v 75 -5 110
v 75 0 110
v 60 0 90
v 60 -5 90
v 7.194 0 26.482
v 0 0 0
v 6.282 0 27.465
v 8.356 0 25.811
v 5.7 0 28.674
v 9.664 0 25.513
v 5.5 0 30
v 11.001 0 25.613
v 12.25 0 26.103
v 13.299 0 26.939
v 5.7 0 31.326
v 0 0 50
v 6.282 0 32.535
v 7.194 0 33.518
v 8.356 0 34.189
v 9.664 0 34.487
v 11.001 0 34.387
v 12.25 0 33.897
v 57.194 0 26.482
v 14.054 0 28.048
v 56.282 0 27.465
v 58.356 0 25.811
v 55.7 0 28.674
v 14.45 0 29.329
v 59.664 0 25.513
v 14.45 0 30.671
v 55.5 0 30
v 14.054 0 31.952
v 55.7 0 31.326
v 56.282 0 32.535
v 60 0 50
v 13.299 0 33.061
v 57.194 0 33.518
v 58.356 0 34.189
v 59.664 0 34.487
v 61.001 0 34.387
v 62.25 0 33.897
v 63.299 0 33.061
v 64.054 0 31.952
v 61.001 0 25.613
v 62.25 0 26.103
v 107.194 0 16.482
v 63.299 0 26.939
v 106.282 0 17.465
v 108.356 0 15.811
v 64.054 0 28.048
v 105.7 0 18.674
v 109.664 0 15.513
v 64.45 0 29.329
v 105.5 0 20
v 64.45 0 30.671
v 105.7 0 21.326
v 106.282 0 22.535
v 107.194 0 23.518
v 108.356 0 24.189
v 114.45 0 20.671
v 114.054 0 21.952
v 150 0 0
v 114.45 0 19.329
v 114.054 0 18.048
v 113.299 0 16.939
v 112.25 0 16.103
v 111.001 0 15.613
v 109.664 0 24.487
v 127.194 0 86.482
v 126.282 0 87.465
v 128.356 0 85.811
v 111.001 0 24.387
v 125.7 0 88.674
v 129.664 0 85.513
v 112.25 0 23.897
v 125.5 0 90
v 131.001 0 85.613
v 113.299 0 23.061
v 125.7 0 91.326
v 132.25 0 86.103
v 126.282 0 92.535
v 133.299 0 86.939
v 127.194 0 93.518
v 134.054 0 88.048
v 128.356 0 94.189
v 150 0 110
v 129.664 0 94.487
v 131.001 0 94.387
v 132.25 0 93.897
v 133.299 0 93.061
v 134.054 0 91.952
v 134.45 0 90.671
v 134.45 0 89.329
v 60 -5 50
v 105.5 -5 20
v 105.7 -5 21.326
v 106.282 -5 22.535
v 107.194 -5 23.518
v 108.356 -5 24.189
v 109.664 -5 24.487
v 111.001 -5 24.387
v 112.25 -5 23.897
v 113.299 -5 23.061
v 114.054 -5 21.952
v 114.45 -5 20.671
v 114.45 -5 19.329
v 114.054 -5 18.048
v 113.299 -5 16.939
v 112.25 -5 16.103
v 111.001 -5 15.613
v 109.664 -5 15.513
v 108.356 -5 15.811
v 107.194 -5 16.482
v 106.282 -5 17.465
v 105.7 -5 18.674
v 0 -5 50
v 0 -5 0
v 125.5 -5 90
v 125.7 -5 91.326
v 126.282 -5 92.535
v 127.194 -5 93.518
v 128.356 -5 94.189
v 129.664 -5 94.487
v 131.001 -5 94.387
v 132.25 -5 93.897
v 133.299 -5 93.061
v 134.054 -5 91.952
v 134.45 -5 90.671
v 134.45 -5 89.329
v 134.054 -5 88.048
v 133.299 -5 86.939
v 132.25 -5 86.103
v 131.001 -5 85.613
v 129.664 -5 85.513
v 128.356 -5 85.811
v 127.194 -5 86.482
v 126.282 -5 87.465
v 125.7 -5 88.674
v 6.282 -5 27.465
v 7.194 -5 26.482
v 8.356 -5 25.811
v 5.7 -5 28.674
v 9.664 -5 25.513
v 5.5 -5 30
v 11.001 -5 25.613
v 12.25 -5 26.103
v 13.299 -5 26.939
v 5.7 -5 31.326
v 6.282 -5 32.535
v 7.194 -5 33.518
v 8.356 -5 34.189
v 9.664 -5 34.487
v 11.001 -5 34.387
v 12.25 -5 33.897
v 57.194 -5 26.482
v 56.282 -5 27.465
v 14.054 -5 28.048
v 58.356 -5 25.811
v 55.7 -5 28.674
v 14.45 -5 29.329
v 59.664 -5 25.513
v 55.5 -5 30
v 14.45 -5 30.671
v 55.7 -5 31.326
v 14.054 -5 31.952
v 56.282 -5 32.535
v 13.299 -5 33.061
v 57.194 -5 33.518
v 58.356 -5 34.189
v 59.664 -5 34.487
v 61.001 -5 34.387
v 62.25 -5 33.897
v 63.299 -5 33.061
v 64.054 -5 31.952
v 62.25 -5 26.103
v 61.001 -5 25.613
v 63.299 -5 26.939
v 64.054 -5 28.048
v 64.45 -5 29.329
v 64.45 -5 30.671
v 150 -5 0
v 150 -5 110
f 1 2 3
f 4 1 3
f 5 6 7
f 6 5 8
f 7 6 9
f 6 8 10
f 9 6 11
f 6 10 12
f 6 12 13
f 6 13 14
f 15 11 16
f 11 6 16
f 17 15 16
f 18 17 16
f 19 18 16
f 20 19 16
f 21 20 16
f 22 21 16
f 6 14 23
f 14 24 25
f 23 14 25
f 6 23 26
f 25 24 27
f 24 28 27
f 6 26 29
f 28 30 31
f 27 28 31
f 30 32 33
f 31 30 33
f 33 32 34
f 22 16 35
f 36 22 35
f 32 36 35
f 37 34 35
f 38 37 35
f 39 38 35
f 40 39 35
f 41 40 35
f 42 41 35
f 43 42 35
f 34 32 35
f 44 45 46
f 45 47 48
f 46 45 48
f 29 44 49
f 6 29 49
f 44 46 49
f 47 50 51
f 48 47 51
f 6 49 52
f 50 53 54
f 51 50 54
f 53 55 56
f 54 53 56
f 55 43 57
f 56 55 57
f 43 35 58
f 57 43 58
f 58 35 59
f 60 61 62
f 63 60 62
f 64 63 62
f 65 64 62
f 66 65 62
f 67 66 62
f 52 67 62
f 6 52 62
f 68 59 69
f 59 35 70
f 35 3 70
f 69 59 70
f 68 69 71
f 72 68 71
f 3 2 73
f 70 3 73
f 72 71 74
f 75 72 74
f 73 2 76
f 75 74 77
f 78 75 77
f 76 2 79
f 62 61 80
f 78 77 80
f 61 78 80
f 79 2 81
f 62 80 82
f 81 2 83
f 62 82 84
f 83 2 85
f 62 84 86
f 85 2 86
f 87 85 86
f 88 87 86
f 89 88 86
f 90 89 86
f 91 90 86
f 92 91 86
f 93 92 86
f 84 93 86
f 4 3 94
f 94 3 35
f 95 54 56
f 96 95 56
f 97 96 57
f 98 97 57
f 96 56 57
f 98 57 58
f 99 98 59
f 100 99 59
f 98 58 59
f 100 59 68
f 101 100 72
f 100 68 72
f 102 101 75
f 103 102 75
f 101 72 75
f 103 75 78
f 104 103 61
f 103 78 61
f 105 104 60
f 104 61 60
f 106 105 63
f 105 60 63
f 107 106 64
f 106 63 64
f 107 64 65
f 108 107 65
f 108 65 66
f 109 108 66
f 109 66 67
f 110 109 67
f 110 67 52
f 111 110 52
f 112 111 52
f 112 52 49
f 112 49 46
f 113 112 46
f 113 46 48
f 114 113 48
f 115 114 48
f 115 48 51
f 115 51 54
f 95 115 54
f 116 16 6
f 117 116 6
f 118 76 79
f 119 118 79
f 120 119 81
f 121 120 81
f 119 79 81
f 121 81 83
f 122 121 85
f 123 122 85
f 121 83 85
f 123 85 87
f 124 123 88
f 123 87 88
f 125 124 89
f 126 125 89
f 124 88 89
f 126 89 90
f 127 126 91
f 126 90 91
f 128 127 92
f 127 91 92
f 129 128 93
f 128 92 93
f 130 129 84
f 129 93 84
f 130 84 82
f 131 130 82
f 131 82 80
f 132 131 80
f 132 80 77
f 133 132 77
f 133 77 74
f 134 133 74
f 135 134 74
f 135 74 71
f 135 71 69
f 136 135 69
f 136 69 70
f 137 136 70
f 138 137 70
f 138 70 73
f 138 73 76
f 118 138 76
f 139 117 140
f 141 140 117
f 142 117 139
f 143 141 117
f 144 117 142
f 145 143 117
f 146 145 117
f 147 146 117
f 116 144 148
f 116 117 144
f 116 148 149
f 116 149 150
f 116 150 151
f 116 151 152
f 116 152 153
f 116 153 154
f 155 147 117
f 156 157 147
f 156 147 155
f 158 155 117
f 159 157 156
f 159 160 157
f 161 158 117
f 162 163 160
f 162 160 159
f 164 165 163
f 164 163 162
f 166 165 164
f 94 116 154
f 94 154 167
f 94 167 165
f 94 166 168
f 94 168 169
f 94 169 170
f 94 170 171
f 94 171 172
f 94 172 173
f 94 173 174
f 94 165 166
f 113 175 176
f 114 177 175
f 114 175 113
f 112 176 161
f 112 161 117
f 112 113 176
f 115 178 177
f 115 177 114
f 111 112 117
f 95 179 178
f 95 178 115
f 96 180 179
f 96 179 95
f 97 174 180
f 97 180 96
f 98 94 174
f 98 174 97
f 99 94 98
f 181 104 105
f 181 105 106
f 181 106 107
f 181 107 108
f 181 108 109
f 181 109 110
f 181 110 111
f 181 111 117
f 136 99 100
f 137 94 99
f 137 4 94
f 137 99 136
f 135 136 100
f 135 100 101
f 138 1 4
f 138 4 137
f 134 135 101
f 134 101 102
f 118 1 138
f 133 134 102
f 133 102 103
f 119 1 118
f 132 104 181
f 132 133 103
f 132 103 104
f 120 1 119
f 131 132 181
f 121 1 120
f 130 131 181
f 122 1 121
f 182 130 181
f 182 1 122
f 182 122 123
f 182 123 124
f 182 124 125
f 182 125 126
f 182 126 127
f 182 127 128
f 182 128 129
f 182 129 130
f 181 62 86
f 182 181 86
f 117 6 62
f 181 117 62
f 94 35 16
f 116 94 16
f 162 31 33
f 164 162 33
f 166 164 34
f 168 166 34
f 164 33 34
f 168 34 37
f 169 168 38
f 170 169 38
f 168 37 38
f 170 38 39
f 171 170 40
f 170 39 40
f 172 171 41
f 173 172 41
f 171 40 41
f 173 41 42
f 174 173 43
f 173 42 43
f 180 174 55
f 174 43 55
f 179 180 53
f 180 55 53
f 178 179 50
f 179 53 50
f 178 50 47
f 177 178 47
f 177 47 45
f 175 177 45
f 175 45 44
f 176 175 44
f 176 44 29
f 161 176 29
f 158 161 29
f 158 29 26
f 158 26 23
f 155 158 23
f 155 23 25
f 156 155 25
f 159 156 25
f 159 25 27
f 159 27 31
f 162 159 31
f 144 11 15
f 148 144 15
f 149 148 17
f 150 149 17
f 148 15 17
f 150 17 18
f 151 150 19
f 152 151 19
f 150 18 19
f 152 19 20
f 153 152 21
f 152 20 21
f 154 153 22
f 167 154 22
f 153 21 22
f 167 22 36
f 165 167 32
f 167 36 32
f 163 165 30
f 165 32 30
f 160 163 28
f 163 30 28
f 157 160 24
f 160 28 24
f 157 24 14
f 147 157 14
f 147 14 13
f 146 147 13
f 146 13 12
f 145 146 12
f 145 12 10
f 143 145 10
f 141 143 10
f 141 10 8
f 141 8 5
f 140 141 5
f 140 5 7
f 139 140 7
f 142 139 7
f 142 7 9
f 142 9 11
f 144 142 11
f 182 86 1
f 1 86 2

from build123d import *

# Parameters (mm, degrees)
F1_DEPTH = 5
F3_D     = 9
F5_D     = 9


with BuildPart() as f1:
    # F0 (on Front) → F1 (new body)
    with BuildSketch(Plane.XZ):
        Polygon((0, 50), (0, 0), (150, 0), (150, 110), (75, 110), (60, 90), (60, 50), align=None)
    extrude(amount=F1_DEPTH)

    # F3 (through all)
    with Locations(Plane.XZ.offset(5)):
        with Locations((10, 30), (60, 30)):
            Hole(F3_D / 2)

    # F5 (through all)
    with Locations(Plane.XZ.offset(5)):
        with Locations((110, 20), (130, 90)):
            Hole(F5_D / 2)


solid = f1.part
